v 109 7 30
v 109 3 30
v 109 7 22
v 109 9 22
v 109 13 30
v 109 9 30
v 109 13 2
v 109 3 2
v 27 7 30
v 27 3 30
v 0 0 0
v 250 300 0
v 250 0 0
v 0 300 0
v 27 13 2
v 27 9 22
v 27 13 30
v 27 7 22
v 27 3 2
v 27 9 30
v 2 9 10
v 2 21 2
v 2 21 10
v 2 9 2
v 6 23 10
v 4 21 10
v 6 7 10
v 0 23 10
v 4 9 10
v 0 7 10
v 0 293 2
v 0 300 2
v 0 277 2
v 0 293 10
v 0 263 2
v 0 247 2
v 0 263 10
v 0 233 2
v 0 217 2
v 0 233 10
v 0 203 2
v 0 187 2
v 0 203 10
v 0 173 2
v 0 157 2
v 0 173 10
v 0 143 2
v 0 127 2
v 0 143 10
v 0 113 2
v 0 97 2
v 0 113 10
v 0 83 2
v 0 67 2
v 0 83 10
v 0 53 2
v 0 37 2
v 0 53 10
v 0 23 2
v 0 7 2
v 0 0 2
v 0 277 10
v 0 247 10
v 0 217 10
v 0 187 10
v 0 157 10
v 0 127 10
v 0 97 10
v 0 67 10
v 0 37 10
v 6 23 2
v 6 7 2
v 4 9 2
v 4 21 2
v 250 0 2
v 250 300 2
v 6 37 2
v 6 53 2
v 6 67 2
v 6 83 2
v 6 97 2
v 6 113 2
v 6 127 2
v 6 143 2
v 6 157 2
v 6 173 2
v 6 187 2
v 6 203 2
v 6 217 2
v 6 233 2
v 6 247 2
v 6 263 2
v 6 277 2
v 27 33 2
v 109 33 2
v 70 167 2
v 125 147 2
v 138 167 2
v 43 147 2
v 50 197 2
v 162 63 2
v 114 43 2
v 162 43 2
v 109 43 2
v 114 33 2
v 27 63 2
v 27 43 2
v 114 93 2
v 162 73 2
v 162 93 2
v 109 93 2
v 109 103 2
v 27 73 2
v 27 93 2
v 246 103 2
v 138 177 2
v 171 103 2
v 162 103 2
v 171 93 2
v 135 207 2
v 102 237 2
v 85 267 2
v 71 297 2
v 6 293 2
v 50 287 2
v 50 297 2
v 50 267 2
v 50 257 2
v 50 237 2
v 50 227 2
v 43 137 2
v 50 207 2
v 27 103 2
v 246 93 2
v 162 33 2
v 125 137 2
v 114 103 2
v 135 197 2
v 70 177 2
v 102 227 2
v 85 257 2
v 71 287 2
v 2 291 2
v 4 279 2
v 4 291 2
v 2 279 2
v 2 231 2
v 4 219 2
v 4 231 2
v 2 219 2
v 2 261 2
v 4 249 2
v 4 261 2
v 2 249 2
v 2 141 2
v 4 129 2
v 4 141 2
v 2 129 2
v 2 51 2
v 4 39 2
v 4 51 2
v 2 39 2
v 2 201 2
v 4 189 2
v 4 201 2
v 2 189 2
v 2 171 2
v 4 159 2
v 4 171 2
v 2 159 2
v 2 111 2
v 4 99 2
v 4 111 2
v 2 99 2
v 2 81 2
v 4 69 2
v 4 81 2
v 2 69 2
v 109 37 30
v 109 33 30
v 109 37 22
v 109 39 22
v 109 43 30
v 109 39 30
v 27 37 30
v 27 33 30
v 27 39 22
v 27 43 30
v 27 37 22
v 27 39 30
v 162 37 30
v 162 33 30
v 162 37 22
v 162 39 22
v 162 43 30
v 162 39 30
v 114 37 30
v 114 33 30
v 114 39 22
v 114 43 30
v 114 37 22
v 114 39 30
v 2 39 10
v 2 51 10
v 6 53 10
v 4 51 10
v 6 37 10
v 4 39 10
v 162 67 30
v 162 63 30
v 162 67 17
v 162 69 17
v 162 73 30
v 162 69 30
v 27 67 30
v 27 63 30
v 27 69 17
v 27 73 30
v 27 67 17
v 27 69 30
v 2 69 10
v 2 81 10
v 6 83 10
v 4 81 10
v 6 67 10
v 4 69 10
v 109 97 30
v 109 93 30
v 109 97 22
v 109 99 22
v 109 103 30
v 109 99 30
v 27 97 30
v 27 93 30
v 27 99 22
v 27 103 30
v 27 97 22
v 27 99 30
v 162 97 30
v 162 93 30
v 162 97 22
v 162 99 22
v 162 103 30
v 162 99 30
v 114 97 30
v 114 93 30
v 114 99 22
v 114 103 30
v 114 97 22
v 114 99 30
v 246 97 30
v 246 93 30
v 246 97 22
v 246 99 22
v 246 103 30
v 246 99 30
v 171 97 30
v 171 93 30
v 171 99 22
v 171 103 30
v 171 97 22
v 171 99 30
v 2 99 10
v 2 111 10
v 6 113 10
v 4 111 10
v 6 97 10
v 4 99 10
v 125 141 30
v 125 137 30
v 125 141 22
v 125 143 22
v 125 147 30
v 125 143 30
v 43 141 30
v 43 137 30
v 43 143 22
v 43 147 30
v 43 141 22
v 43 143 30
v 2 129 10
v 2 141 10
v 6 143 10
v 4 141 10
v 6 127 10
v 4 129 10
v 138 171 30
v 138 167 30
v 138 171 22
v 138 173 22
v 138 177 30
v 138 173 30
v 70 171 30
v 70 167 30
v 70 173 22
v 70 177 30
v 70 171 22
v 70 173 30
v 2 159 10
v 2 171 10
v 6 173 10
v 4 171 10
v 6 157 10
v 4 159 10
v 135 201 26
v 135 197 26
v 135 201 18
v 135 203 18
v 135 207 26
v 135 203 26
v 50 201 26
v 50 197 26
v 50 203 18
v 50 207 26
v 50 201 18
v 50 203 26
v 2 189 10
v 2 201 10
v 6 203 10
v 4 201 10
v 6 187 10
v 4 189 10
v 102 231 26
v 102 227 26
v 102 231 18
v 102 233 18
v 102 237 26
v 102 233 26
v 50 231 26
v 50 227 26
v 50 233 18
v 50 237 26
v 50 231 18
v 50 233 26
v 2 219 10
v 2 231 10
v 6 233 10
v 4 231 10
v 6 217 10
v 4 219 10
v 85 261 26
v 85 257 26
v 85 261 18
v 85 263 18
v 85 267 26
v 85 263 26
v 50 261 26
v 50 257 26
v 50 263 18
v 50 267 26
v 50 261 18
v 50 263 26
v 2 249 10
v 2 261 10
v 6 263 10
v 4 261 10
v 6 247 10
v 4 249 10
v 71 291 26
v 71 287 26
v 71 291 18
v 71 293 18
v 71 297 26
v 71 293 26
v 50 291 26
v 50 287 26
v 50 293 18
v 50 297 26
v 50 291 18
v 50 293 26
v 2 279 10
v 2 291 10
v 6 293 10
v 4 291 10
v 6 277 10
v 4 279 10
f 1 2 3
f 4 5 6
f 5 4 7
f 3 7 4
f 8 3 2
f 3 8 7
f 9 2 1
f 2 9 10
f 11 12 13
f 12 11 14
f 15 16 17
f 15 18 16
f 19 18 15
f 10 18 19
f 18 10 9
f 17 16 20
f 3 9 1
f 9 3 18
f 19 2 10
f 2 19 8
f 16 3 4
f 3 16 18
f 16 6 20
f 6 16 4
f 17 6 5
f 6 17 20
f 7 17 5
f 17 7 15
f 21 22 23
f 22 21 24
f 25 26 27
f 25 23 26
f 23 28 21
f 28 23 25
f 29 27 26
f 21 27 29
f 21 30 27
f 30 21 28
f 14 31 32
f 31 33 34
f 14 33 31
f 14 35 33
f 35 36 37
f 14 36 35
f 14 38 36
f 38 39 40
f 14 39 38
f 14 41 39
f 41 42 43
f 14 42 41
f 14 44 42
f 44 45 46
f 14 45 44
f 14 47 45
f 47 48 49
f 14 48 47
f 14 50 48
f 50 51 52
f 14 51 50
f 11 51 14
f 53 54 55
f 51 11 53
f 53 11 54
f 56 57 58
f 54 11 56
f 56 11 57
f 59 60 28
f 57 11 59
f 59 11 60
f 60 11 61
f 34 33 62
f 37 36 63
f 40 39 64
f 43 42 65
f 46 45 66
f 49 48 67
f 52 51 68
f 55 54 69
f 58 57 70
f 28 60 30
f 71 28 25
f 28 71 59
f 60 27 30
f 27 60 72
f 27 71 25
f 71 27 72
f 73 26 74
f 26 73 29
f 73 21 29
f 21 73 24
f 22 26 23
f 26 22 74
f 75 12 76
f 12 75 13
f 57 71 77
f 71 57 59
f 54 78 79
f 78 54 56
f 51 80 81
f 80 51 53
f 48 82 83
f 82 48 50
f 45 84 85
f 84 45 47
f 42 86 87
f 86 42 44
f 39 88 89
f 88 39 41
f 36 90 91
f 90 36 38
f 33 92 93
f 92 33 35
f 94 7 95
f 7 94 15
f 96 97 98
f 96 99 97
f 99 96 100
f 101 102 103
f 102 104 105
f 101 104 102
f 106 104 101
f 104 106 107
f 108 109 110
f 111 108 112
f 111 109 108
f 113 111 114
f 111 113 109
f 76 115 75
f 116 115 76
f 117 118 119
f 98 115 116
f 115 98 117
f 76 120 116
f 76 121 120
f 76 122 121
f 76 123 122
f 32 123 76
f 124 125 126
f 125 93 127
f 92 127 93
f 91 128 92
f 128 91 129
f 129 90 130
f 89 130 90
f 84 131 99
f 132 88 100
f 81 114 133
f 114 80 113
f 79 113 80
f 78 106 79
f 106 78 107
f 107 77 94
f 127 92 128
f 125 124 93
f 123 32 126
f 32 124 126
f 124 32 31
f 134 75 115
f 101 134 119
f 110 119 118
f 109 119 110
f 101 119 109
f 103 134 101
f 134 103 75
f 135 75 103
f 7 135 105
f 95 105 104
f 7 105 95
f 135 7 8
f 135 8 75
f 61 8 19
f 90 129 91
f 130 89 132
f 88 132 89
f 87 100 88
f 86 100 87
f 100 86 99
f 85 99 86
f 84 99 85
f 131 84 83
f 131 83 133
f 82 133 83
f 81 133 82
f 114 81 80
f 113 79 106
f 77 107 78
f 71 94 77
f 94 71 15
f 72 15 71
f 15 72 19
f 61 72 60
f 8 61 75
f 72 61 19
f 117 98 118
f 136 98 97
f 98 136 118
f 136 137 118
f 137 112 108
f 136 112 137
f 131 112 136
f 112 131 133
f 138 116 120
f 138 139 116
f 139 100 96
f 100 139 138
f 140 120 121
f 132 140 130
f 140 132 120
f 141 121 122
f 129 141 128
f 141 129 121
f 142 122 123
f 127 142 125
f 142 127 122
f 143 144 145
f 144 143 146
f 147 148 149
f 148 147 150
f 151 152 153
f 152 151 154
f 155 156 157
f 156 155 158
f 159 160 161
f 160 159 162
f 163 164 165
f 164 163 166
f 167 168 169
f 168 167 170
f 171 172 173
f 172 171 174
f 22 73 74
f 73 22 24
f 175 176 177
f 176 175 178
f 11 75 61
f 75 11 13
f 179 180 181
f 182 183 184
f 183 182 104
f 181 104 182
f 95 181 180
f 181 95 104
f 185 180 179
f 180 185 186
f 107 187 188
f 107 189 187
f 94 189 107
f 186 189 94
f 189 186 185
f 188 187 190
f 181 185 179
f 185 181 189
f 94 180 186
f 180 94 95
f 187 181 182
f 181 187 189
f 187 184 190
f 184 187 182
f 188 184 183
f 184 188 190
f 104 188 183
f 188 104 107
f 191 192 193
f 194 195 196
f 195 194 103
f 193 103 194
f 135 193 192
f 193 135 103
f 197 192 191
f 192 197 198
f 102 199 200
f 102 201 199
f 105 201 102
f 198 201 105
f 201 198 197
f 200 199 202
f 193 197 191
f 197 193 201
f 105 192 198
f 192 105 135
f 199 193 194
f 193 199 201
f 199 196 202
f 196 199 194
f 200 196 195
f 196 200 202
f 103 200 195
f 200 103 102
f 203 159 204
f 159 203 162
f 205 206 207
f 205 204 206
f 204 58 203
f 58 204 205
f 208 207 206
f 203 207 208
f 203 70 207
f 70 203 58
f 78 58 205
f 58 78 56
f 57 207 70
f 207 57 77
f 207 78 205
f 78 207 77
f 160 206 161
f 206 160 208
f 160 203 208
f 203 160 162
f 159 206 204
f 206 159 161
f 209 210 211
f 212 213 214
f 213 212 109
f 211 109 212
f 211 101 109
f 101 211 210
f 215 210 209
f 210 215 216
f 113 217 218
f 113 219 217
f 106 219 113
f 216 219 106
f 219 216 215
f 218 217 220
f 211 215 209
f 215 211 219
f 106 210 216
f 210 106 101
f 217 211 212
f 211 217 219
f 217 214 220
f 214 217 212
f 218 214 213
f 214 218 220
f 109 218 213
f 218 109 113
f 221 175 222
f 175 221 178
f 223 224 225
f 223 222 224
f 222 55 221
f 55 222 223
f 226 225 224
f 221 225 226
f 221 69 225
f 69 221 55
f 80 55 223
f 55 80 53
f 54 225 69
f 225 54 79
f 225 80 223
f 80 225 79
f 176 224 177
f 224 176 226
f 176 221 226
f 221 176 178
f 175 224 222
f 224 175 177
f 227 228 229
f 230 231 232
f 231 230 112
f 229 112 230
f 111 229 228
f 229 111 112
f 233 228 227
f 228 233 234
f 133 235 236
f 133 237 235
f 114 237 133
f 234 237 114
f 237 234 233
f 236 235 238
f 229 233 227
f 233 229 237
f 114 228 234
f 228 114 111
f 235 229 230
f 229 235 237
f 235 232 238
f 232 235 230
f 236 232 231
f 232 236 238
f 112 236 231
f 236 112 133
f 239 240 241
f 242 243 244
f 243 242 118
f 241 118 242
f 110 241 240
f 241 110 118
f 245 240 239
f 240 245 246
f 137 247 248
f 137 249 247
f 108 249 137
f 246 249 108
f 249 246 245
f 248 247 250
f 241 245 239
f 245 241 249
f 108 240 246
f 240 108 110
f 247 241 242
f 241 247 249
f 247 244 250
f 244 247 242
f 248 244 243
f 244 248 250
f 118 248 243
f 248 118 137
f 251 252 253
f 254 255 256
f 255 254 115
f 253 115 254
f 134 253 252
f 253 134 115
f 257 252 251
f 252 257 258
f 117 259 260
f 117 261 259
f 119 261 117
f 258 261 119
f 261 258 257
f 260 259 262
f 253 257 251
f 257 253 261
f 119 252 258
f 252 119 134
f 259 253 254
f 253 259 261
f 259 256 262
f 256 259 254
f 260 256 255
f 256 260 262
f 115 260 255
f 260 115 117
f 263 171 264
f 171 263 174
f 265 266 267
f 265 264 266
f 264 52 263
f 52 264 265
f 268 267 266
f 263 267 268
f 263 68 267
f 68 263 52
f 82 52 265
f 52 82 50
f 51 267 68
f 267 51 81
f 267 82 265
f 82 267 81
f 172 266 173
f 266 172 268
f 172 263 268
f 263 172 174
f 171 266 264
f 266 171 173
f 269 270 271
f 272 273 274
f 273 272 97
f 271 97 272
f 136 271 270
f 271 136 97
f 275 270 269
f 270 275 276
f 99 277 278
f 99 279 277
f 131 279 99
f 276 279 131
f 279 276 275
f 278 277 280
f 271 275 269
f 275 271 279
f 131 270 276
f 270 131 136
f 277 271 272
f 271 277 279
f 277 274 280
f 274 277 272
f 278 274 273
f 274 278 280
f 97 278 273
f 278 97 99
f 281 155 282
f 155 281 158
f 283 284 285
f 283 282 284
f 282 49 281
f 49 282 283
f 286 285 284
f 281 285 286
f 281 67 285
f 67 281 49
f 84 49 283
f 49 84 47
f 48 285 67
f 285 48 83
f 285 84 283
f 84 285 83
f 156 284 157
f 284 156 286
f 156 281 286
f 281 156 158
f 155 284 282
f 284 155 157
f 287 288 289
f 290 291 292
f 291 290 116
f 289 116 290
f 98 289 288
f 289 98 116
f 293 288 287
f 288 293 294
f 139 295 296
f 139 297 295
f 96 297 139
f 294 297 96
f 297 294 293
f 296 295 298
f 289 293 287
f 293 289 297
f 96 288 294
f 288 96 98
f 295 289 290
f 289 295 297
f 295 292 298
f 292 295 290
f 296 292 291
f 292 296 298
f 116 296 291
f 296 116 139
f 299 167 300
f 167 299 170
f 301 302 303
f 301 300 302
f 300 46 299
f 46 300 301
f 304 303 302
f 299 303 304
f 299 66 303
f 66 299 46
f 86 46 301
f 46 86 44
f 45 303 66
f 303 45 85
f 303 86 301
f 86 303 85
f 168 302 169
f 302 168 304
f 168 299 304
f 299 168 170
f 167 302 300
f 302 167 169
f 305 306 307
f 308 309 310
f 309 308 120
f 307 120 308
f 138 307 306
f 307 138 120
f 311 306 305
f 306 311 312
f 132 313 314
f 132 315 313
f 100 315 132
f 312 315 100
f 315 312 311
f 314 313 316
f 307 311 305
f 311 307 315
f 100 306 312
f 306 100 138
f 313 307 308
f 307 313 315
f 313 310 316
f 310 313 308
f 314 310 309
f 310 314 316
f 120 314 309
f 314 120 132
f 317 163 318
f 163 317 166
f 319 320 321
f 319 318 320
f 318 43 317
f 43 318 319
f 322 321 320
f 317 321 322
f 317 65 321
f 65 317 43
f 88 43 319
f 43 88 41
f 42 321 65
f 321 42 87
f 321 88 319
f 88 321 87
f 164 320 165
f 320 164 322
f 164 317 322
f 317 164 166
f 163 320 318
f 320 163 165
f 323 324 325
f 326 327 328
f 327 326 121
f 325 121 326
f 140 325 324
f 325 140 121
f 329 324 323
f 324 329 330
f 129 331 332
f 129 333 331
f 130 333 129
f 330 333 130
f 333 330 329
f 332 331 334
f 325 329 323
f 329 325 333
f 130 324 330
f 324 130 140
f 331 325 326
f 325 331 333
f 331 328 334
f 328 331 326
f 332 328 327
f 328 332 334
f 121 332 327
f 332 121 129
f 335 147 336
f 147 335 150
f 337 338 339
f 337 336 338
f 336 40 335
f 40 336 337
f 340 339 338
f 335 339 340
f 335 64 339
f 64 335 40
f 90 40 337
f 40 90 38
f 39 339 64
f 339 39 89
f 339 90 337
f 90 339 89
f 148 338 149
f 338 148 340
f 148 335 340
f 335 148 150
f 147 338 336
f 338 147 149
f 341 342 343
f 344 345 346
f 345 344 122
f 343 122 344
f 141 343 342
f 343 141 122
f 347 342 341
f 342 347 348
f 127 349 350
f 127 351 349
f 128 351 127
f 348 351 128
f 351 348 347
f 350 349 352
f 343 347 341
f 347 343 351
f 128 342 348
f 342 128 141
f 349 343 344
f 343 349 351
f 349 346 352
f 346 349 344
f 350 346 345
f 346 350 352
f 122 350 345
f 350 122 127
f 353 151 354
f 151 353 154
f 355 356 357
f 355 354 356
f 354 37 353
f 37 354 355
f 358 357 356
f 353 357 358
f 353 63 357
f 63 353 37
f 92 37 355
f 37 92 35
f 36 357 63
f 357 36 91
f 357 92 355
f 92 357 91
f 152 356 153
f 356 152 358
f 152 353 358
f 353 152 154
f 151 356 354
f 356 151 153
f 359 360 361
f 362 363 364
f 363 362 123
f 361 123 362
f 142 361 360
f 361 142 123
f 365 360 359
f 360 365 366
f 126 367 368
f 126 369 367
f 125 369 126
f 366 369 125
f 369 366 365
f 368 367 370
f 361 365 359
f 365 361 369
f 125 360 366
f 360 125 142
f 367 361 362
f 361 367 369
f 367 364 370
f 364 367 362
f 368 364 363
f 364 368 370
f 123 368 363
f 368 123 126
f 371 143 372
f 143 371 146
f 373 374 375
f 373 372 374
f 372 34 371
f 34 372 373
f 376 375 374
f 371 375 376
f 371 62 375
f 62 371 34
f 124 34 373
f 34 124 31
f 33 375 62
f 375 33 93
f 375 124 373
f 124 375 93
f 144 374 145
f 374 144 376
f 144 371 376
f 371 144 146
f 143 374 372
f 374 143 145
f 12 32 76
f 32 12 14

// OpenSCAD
// file: ../cardshowcase.scad
module base_tarjeta(desplazamiento, posicion_tarjeta, longitud_tarjeta, altura_borde_tarjeta, altura_interior_tarjeta)
{
    color("purple") translate([ posicion_tarjeta, desplazamiento + 1, 0 ])
        cube([ longitud_tarjeta, 4, altura_borde_tarjeta + 2 ]);

    color("pink") translate([ posicion_tarjeta, desplazamiento + 5, 0 ])
        cube([ longitud_tarjeta, 2, altura_interior_tarjeta + 2 ]);

    color("purple") translate([ posicion_tarjeta, desplazamiento + 7, 0 ])
        cube([ longitud_tarjeta, 4, altura_borde_tarjeta + 2 ]);
}

module base_tarjeta_corta(desplazamiento, posicion_tarjeta, longitud_tarjeta, altura_borde_tarjeta,
                          altura_interior_tarjeta, tab_size)
{
    color("purple") translate([ posicion_tarjeta, desplazamiento + 1, 0 ])
        cube([ tab_size, 4, altura_borde_tarjeta + 2 ]);

    color("pink") translate([ posicion_tarjeta, desplazamiento + 5, 0 ])
        cube([ tab_size, 2, altura_interior_tarjeta + 2 ]);

    color("purple") translate([ posicion_tarjeta, desplazamiento + 7, 0 ])
        cube([ tab_size, 4, altura_borde_tarjeta + 2 ]);

    color("purple") translate([ longitud_tarjeta + posicion_tarjeta - tab_size, desplazamiento + 1, 0 ])
        cube([ tab_size, 4, altura_borde_tarjeta + 2 ]);

    color("pink") translate([ longitud_tarjeta + posicion_tarjeta - tab_size, desplazamiento + 5, 0 ])
        cube([ tab_size, 2, altura_interior_tarjeta + 2 ]);

    color("purple") translate([ longitud_tarjeta + posicion_tarjeta - tab_size, desplazamiento + 7, 0 ])
        cube([ tab_size, 4, altura_borde_tarjeta + 2 ]);
}

module soporte_tarjeta(tipo, size)
{
    if (tipo == "ISA8")
    {
        desplazamiento = 2;
        posicion_tarjeta = 27;
        longitud_tarjeta = 82;
        altura_borde_tarjeta = 28;
        altura_interior_tarjeta = 20;

        if (size == 0)
        {
            base_tarjeta(desplazamiento, posicion_tarjeta, longitud_tarjeta, altura_borde_tarjeta,
                         altura_interior_tarjeta);
        }
        else
        {
            base_tarjeta_corta(desplazamiento, posicion_tarjeta, longitud_tarjeta, altura_borde_tarjeta,
                               altura_interior_tarjeta, size);
        }
    }
    else if (tipo == "ISA16")
    {
        soporte_tarjeta("ISA8", size);

        desplazamiento = 2;
        posicion_tarjeta = 28 + 81 + 5;
        longitud_tarjeta = 48;
        altura_borde_tarjeta = 28;
        altura_interior_tarjeta = 20;

        if (size == 0)
        {
            base_tarjeta(desplazamiento, posicion_tarjeta, longitud_tarjeta, altura_borde_tarjeta,
                         altura_interior_tarjeta);
        }
        else
        {
            base_tarjeta_corta(desplazamiento, posicion_tarjeta, longitud_tarjeta, altura_borde_tarjeta,
                               altura_interior_tarjeta, size);
        }
    }
    else if (tipo == "VLB")
    {
        soporte_tarjeta("ISA16", size);

        desplazamiento = 2;
        posicion_tarjeta = 28 + 135 + 8;
        longitud_tarjeta = 75;
        altura_borde_tarjeta = 28;
        altura_interior_tarjeta = 20;

        if (size == 0)
        {
            base_tarjeta(desplazamiento, posicion_tarjeta, longitud_tarjeta, altura_borde_tarjeta,
                         altura_interior_tarjeta);
        }
        else
        {
            base_tarjeta_corta(desplazamiento, posicion_tarjeta, longitud_tarjeta, altura_borde_tarjeta,
                               altura_interior_tarjeta, size);
        }
    }
    else if (tipo == "PCI")
    {
        desplazamiento = 16;
        posicion_tarjeta = 43;
        longitud_tarjeta = 82;
        altura_borde_tarjeta = 28;
        altura_interior_tarjeta = 20;

        if (size == 0)
        {
            base_tarjeta(desplazamiento, posicion_tarjeta, longitud_tarjeta, altura_borde_tarjeta,
                         altura_interior_tarjeta);
        }
        else
        {
            base_tarjeta_corta(desplazamiento, posicion_tarjeta, longitud_tarjeta, altura_borde_tarjeta,
                               altura_interior_tarjeta, size);
        }
    }
    else if (tipo == "PCIe16")
    {
        desplazamiento = 16;
        posicion_tarjeta = 50;
        longitud_tarjeta = 85;
        altura_borde_tarjeta = 24;
        altura_interior_tarjeta = 16;

        if (size == 0)
        {
            base_tarjeta(desplazamiento, posicion_tarjeta, longitud_tarjeta, altura_borde_tarjeta,
                         altura_interior_tarjeta);
        }
        else
        {
            base_tarjeta_corta(desplazamiento, posicion_tarjeta, longitud_tarjeta, altura_borde_tarjeta,
                               altura_interior_tarjeta, size);
        }
    }
    else if (tipo == "PCIe8")
    {
        desplazamiento = 16;
        posicion_tarjeta = 50;
        longitud_tarjeta = 52;
        altura_borde_tarjeta = 24;
        altura_interior_tarjeta = 16;

        if (size == 0)
        {
            base_tarjeta(desplazamiento, posicion_tarjeta, longitud_tarjeta, altura_borde_tarjeta,
                         altura_interior_tarjeta);
        }
        else
        {
            base_tarjeta_corta(desplazamiento, posicion_tarjeta, longitud_tarjeta, altura_borde_tarjeta,
                               altura_interior_tarjeta, size);
        }
    }
    else if (tipo == "PCIe4")
    {
        desplazamiento = 16;
        posicion_tarjeta = 50;
        longitud_tarjeta = 35;
        altura_borde_tarjeta = 24;
        altura_interior_tarjeta = 16;

        if (size == 0)
        {
            base_tarjeta(desplazamiento, posicion_tarjeta, longitud_tarjeta, altura_borde_tarjeta,
                         altura_interior_tarjeta);
        }
        else
        {
            base_tarjeta_corta(desplazamiento, posicion_tarjeta, longitud_tarjeta, altura_borde_tarjeta,
                               altura_interior_tarjeta, size);
        }
    }
    else if (tipo == "PCIe1")
    {
        desplazamiento = 16;
        posicion_tarjeta = 50;
        longitud_tarjeta = 21;
        altura_borde_tarjeta = 24;
        altura_interior_tarjeta = 16;

        if (size == 0)
        {
            base_tarjeta(desplazamiento, posicion_tarjeta, longitud_tarjeta, altura_borde_tarjeta,
                         altura_interior_tarjeta);
        }
        else
        {
            base_tarjeta_corta(desplazamiento, posicion_tarjeta, longitud_tarjeta, altura_borde_tarjeta,
                               altura_interior_tarjeta, size);
        }
    }
    else if (tipo == "AGP")
    {
        desplazamiento = 16;
        posicion_tarjeta = 70;
        longitud_tarjeta = 68;
        altura_borde_tarjeta = 28;
        altura_interior_tarjeta = 20;

        if (size == 0)
        {
            base_tarjeta(desplazamiento, posicion_tarjeta, longitud_tarjeta, altura_borde_tarjeta,
                         altura_interior_tarjeta);
        }
        else
        {
            base_tarjeta_corta(desplazamiento, posicion_tarjeta, longitud_tarjeta, altura_borde_tarjeta,
                               altura_interior_tarjeta, size);
        }
    }
    else if (tipo == "EISA")
    {
        desplazamiento = 2;
        posicion_tarjeta = 27;
        longitud_tarjeta = 52 + 83;
        altura_borde_tarjeta = 28;
        altura_interior_tarjeta = 15;

        if (size == 0)
        {
            base_tarjeta(desplazamiento, posicion_tarjeta, longitud_tarjeta, altura_borde_tarjeta,
                         altura_interior_tarjeta);
        }
        else
        {
            base_tarjeta_corta(desplazamiento, posicion_tarjeta, longitud_tarjeta, altura_borde_tarjeta,
                               altura_interior_tarjeta, size);
        }
    }
}

module base_placa(tipo)
{
    if (tipo == "ISA8")
    {
        color("cyan") cube([ 109, 30, 2 ]);
    }
    else if (tipo == "ISA16")
    {
        color("cyan") cube([ 162, 30, 2 ]);
    }
    else if (tipo == "VLB")
    {
        color("cyan") cube([ 246, 30, 2 ]);
    }
    else if (tipo == "PCI")
    {
        color("cyan") cube([ 125, 30, 2 ]);
    }
    else if (tipo == "PCIe16")
    {
        color("cyan") cube([ 135, 30, 2 ]);
    }
    else if (tipo == "PCIe8")
    {
        color("cyan") cube([ 102, 30, 2 ]);
    }
    else if (tipo == "PCIe4")
    {
        color("cyan") cube([ 85, 30, 2 ]);
    }
    else if (tipo == "PCIe1")
    {
        color("cyan") cube([ 71, 30, 2 ]);
    }
    else if (tipo == "AGP")
    {
        color("cyan") cube([ 138, 30, 2 ]);
    }
    else if (tipo == "EISA")
    {
        color("cyan") cube([ 162, 30, 2 ]);
    }
    else if (is_num(tipo))
    {
        color("cyan") cube([ tipo, 30, 2]);
    }
}

override_base = undef;

module base(tipo)
{
    if (override_base == undef)
    {
        base_placa(tipo);
    }
    else
    {
        base_placa(override_base);
    }
}

module single_slot(tipo, position, size = 0)
{
    displacement = position * 30;

    color("red") translate([ 0, 7 + displacement, 0 ]) cube([ 2, 16, 10 ]);

    color("red") translate([ 4, 7 + displacement, 0 ]) cube([ 2, 16, 10 ]);

    color("red") translate([ 2, 7 + displacement, 0 ]) cube([ 2, 2, 10 ]);

    color("red") translate([ 2, 21 + displacement, 0 ]) cube([ 2, 2, 10 ]);

    translate([ 0, displacement, 0 ]) soporte_tarjeta(tipo, size);
    translate([ 0, displacement, 0 ]) base(tipo);
}
// main file
include <../cardshowcase.scad>

// override_base is optional, can be a number (mm) or a type of card ("ISA16", ...)
override_base = 250;

single_slot("ISA8", 0);
single_slot("ISA16", 1);
single_slot("EISA", 2);
single_slot("VLB", 3);
single_slot("PCI", 4);
single_slot("AGP", 5);
single_slot("PCIe16", 6);
single_slot("PCIe8", 7);
single_slot("PCIe4", 8);
single_slot("PCIe1", 9);
